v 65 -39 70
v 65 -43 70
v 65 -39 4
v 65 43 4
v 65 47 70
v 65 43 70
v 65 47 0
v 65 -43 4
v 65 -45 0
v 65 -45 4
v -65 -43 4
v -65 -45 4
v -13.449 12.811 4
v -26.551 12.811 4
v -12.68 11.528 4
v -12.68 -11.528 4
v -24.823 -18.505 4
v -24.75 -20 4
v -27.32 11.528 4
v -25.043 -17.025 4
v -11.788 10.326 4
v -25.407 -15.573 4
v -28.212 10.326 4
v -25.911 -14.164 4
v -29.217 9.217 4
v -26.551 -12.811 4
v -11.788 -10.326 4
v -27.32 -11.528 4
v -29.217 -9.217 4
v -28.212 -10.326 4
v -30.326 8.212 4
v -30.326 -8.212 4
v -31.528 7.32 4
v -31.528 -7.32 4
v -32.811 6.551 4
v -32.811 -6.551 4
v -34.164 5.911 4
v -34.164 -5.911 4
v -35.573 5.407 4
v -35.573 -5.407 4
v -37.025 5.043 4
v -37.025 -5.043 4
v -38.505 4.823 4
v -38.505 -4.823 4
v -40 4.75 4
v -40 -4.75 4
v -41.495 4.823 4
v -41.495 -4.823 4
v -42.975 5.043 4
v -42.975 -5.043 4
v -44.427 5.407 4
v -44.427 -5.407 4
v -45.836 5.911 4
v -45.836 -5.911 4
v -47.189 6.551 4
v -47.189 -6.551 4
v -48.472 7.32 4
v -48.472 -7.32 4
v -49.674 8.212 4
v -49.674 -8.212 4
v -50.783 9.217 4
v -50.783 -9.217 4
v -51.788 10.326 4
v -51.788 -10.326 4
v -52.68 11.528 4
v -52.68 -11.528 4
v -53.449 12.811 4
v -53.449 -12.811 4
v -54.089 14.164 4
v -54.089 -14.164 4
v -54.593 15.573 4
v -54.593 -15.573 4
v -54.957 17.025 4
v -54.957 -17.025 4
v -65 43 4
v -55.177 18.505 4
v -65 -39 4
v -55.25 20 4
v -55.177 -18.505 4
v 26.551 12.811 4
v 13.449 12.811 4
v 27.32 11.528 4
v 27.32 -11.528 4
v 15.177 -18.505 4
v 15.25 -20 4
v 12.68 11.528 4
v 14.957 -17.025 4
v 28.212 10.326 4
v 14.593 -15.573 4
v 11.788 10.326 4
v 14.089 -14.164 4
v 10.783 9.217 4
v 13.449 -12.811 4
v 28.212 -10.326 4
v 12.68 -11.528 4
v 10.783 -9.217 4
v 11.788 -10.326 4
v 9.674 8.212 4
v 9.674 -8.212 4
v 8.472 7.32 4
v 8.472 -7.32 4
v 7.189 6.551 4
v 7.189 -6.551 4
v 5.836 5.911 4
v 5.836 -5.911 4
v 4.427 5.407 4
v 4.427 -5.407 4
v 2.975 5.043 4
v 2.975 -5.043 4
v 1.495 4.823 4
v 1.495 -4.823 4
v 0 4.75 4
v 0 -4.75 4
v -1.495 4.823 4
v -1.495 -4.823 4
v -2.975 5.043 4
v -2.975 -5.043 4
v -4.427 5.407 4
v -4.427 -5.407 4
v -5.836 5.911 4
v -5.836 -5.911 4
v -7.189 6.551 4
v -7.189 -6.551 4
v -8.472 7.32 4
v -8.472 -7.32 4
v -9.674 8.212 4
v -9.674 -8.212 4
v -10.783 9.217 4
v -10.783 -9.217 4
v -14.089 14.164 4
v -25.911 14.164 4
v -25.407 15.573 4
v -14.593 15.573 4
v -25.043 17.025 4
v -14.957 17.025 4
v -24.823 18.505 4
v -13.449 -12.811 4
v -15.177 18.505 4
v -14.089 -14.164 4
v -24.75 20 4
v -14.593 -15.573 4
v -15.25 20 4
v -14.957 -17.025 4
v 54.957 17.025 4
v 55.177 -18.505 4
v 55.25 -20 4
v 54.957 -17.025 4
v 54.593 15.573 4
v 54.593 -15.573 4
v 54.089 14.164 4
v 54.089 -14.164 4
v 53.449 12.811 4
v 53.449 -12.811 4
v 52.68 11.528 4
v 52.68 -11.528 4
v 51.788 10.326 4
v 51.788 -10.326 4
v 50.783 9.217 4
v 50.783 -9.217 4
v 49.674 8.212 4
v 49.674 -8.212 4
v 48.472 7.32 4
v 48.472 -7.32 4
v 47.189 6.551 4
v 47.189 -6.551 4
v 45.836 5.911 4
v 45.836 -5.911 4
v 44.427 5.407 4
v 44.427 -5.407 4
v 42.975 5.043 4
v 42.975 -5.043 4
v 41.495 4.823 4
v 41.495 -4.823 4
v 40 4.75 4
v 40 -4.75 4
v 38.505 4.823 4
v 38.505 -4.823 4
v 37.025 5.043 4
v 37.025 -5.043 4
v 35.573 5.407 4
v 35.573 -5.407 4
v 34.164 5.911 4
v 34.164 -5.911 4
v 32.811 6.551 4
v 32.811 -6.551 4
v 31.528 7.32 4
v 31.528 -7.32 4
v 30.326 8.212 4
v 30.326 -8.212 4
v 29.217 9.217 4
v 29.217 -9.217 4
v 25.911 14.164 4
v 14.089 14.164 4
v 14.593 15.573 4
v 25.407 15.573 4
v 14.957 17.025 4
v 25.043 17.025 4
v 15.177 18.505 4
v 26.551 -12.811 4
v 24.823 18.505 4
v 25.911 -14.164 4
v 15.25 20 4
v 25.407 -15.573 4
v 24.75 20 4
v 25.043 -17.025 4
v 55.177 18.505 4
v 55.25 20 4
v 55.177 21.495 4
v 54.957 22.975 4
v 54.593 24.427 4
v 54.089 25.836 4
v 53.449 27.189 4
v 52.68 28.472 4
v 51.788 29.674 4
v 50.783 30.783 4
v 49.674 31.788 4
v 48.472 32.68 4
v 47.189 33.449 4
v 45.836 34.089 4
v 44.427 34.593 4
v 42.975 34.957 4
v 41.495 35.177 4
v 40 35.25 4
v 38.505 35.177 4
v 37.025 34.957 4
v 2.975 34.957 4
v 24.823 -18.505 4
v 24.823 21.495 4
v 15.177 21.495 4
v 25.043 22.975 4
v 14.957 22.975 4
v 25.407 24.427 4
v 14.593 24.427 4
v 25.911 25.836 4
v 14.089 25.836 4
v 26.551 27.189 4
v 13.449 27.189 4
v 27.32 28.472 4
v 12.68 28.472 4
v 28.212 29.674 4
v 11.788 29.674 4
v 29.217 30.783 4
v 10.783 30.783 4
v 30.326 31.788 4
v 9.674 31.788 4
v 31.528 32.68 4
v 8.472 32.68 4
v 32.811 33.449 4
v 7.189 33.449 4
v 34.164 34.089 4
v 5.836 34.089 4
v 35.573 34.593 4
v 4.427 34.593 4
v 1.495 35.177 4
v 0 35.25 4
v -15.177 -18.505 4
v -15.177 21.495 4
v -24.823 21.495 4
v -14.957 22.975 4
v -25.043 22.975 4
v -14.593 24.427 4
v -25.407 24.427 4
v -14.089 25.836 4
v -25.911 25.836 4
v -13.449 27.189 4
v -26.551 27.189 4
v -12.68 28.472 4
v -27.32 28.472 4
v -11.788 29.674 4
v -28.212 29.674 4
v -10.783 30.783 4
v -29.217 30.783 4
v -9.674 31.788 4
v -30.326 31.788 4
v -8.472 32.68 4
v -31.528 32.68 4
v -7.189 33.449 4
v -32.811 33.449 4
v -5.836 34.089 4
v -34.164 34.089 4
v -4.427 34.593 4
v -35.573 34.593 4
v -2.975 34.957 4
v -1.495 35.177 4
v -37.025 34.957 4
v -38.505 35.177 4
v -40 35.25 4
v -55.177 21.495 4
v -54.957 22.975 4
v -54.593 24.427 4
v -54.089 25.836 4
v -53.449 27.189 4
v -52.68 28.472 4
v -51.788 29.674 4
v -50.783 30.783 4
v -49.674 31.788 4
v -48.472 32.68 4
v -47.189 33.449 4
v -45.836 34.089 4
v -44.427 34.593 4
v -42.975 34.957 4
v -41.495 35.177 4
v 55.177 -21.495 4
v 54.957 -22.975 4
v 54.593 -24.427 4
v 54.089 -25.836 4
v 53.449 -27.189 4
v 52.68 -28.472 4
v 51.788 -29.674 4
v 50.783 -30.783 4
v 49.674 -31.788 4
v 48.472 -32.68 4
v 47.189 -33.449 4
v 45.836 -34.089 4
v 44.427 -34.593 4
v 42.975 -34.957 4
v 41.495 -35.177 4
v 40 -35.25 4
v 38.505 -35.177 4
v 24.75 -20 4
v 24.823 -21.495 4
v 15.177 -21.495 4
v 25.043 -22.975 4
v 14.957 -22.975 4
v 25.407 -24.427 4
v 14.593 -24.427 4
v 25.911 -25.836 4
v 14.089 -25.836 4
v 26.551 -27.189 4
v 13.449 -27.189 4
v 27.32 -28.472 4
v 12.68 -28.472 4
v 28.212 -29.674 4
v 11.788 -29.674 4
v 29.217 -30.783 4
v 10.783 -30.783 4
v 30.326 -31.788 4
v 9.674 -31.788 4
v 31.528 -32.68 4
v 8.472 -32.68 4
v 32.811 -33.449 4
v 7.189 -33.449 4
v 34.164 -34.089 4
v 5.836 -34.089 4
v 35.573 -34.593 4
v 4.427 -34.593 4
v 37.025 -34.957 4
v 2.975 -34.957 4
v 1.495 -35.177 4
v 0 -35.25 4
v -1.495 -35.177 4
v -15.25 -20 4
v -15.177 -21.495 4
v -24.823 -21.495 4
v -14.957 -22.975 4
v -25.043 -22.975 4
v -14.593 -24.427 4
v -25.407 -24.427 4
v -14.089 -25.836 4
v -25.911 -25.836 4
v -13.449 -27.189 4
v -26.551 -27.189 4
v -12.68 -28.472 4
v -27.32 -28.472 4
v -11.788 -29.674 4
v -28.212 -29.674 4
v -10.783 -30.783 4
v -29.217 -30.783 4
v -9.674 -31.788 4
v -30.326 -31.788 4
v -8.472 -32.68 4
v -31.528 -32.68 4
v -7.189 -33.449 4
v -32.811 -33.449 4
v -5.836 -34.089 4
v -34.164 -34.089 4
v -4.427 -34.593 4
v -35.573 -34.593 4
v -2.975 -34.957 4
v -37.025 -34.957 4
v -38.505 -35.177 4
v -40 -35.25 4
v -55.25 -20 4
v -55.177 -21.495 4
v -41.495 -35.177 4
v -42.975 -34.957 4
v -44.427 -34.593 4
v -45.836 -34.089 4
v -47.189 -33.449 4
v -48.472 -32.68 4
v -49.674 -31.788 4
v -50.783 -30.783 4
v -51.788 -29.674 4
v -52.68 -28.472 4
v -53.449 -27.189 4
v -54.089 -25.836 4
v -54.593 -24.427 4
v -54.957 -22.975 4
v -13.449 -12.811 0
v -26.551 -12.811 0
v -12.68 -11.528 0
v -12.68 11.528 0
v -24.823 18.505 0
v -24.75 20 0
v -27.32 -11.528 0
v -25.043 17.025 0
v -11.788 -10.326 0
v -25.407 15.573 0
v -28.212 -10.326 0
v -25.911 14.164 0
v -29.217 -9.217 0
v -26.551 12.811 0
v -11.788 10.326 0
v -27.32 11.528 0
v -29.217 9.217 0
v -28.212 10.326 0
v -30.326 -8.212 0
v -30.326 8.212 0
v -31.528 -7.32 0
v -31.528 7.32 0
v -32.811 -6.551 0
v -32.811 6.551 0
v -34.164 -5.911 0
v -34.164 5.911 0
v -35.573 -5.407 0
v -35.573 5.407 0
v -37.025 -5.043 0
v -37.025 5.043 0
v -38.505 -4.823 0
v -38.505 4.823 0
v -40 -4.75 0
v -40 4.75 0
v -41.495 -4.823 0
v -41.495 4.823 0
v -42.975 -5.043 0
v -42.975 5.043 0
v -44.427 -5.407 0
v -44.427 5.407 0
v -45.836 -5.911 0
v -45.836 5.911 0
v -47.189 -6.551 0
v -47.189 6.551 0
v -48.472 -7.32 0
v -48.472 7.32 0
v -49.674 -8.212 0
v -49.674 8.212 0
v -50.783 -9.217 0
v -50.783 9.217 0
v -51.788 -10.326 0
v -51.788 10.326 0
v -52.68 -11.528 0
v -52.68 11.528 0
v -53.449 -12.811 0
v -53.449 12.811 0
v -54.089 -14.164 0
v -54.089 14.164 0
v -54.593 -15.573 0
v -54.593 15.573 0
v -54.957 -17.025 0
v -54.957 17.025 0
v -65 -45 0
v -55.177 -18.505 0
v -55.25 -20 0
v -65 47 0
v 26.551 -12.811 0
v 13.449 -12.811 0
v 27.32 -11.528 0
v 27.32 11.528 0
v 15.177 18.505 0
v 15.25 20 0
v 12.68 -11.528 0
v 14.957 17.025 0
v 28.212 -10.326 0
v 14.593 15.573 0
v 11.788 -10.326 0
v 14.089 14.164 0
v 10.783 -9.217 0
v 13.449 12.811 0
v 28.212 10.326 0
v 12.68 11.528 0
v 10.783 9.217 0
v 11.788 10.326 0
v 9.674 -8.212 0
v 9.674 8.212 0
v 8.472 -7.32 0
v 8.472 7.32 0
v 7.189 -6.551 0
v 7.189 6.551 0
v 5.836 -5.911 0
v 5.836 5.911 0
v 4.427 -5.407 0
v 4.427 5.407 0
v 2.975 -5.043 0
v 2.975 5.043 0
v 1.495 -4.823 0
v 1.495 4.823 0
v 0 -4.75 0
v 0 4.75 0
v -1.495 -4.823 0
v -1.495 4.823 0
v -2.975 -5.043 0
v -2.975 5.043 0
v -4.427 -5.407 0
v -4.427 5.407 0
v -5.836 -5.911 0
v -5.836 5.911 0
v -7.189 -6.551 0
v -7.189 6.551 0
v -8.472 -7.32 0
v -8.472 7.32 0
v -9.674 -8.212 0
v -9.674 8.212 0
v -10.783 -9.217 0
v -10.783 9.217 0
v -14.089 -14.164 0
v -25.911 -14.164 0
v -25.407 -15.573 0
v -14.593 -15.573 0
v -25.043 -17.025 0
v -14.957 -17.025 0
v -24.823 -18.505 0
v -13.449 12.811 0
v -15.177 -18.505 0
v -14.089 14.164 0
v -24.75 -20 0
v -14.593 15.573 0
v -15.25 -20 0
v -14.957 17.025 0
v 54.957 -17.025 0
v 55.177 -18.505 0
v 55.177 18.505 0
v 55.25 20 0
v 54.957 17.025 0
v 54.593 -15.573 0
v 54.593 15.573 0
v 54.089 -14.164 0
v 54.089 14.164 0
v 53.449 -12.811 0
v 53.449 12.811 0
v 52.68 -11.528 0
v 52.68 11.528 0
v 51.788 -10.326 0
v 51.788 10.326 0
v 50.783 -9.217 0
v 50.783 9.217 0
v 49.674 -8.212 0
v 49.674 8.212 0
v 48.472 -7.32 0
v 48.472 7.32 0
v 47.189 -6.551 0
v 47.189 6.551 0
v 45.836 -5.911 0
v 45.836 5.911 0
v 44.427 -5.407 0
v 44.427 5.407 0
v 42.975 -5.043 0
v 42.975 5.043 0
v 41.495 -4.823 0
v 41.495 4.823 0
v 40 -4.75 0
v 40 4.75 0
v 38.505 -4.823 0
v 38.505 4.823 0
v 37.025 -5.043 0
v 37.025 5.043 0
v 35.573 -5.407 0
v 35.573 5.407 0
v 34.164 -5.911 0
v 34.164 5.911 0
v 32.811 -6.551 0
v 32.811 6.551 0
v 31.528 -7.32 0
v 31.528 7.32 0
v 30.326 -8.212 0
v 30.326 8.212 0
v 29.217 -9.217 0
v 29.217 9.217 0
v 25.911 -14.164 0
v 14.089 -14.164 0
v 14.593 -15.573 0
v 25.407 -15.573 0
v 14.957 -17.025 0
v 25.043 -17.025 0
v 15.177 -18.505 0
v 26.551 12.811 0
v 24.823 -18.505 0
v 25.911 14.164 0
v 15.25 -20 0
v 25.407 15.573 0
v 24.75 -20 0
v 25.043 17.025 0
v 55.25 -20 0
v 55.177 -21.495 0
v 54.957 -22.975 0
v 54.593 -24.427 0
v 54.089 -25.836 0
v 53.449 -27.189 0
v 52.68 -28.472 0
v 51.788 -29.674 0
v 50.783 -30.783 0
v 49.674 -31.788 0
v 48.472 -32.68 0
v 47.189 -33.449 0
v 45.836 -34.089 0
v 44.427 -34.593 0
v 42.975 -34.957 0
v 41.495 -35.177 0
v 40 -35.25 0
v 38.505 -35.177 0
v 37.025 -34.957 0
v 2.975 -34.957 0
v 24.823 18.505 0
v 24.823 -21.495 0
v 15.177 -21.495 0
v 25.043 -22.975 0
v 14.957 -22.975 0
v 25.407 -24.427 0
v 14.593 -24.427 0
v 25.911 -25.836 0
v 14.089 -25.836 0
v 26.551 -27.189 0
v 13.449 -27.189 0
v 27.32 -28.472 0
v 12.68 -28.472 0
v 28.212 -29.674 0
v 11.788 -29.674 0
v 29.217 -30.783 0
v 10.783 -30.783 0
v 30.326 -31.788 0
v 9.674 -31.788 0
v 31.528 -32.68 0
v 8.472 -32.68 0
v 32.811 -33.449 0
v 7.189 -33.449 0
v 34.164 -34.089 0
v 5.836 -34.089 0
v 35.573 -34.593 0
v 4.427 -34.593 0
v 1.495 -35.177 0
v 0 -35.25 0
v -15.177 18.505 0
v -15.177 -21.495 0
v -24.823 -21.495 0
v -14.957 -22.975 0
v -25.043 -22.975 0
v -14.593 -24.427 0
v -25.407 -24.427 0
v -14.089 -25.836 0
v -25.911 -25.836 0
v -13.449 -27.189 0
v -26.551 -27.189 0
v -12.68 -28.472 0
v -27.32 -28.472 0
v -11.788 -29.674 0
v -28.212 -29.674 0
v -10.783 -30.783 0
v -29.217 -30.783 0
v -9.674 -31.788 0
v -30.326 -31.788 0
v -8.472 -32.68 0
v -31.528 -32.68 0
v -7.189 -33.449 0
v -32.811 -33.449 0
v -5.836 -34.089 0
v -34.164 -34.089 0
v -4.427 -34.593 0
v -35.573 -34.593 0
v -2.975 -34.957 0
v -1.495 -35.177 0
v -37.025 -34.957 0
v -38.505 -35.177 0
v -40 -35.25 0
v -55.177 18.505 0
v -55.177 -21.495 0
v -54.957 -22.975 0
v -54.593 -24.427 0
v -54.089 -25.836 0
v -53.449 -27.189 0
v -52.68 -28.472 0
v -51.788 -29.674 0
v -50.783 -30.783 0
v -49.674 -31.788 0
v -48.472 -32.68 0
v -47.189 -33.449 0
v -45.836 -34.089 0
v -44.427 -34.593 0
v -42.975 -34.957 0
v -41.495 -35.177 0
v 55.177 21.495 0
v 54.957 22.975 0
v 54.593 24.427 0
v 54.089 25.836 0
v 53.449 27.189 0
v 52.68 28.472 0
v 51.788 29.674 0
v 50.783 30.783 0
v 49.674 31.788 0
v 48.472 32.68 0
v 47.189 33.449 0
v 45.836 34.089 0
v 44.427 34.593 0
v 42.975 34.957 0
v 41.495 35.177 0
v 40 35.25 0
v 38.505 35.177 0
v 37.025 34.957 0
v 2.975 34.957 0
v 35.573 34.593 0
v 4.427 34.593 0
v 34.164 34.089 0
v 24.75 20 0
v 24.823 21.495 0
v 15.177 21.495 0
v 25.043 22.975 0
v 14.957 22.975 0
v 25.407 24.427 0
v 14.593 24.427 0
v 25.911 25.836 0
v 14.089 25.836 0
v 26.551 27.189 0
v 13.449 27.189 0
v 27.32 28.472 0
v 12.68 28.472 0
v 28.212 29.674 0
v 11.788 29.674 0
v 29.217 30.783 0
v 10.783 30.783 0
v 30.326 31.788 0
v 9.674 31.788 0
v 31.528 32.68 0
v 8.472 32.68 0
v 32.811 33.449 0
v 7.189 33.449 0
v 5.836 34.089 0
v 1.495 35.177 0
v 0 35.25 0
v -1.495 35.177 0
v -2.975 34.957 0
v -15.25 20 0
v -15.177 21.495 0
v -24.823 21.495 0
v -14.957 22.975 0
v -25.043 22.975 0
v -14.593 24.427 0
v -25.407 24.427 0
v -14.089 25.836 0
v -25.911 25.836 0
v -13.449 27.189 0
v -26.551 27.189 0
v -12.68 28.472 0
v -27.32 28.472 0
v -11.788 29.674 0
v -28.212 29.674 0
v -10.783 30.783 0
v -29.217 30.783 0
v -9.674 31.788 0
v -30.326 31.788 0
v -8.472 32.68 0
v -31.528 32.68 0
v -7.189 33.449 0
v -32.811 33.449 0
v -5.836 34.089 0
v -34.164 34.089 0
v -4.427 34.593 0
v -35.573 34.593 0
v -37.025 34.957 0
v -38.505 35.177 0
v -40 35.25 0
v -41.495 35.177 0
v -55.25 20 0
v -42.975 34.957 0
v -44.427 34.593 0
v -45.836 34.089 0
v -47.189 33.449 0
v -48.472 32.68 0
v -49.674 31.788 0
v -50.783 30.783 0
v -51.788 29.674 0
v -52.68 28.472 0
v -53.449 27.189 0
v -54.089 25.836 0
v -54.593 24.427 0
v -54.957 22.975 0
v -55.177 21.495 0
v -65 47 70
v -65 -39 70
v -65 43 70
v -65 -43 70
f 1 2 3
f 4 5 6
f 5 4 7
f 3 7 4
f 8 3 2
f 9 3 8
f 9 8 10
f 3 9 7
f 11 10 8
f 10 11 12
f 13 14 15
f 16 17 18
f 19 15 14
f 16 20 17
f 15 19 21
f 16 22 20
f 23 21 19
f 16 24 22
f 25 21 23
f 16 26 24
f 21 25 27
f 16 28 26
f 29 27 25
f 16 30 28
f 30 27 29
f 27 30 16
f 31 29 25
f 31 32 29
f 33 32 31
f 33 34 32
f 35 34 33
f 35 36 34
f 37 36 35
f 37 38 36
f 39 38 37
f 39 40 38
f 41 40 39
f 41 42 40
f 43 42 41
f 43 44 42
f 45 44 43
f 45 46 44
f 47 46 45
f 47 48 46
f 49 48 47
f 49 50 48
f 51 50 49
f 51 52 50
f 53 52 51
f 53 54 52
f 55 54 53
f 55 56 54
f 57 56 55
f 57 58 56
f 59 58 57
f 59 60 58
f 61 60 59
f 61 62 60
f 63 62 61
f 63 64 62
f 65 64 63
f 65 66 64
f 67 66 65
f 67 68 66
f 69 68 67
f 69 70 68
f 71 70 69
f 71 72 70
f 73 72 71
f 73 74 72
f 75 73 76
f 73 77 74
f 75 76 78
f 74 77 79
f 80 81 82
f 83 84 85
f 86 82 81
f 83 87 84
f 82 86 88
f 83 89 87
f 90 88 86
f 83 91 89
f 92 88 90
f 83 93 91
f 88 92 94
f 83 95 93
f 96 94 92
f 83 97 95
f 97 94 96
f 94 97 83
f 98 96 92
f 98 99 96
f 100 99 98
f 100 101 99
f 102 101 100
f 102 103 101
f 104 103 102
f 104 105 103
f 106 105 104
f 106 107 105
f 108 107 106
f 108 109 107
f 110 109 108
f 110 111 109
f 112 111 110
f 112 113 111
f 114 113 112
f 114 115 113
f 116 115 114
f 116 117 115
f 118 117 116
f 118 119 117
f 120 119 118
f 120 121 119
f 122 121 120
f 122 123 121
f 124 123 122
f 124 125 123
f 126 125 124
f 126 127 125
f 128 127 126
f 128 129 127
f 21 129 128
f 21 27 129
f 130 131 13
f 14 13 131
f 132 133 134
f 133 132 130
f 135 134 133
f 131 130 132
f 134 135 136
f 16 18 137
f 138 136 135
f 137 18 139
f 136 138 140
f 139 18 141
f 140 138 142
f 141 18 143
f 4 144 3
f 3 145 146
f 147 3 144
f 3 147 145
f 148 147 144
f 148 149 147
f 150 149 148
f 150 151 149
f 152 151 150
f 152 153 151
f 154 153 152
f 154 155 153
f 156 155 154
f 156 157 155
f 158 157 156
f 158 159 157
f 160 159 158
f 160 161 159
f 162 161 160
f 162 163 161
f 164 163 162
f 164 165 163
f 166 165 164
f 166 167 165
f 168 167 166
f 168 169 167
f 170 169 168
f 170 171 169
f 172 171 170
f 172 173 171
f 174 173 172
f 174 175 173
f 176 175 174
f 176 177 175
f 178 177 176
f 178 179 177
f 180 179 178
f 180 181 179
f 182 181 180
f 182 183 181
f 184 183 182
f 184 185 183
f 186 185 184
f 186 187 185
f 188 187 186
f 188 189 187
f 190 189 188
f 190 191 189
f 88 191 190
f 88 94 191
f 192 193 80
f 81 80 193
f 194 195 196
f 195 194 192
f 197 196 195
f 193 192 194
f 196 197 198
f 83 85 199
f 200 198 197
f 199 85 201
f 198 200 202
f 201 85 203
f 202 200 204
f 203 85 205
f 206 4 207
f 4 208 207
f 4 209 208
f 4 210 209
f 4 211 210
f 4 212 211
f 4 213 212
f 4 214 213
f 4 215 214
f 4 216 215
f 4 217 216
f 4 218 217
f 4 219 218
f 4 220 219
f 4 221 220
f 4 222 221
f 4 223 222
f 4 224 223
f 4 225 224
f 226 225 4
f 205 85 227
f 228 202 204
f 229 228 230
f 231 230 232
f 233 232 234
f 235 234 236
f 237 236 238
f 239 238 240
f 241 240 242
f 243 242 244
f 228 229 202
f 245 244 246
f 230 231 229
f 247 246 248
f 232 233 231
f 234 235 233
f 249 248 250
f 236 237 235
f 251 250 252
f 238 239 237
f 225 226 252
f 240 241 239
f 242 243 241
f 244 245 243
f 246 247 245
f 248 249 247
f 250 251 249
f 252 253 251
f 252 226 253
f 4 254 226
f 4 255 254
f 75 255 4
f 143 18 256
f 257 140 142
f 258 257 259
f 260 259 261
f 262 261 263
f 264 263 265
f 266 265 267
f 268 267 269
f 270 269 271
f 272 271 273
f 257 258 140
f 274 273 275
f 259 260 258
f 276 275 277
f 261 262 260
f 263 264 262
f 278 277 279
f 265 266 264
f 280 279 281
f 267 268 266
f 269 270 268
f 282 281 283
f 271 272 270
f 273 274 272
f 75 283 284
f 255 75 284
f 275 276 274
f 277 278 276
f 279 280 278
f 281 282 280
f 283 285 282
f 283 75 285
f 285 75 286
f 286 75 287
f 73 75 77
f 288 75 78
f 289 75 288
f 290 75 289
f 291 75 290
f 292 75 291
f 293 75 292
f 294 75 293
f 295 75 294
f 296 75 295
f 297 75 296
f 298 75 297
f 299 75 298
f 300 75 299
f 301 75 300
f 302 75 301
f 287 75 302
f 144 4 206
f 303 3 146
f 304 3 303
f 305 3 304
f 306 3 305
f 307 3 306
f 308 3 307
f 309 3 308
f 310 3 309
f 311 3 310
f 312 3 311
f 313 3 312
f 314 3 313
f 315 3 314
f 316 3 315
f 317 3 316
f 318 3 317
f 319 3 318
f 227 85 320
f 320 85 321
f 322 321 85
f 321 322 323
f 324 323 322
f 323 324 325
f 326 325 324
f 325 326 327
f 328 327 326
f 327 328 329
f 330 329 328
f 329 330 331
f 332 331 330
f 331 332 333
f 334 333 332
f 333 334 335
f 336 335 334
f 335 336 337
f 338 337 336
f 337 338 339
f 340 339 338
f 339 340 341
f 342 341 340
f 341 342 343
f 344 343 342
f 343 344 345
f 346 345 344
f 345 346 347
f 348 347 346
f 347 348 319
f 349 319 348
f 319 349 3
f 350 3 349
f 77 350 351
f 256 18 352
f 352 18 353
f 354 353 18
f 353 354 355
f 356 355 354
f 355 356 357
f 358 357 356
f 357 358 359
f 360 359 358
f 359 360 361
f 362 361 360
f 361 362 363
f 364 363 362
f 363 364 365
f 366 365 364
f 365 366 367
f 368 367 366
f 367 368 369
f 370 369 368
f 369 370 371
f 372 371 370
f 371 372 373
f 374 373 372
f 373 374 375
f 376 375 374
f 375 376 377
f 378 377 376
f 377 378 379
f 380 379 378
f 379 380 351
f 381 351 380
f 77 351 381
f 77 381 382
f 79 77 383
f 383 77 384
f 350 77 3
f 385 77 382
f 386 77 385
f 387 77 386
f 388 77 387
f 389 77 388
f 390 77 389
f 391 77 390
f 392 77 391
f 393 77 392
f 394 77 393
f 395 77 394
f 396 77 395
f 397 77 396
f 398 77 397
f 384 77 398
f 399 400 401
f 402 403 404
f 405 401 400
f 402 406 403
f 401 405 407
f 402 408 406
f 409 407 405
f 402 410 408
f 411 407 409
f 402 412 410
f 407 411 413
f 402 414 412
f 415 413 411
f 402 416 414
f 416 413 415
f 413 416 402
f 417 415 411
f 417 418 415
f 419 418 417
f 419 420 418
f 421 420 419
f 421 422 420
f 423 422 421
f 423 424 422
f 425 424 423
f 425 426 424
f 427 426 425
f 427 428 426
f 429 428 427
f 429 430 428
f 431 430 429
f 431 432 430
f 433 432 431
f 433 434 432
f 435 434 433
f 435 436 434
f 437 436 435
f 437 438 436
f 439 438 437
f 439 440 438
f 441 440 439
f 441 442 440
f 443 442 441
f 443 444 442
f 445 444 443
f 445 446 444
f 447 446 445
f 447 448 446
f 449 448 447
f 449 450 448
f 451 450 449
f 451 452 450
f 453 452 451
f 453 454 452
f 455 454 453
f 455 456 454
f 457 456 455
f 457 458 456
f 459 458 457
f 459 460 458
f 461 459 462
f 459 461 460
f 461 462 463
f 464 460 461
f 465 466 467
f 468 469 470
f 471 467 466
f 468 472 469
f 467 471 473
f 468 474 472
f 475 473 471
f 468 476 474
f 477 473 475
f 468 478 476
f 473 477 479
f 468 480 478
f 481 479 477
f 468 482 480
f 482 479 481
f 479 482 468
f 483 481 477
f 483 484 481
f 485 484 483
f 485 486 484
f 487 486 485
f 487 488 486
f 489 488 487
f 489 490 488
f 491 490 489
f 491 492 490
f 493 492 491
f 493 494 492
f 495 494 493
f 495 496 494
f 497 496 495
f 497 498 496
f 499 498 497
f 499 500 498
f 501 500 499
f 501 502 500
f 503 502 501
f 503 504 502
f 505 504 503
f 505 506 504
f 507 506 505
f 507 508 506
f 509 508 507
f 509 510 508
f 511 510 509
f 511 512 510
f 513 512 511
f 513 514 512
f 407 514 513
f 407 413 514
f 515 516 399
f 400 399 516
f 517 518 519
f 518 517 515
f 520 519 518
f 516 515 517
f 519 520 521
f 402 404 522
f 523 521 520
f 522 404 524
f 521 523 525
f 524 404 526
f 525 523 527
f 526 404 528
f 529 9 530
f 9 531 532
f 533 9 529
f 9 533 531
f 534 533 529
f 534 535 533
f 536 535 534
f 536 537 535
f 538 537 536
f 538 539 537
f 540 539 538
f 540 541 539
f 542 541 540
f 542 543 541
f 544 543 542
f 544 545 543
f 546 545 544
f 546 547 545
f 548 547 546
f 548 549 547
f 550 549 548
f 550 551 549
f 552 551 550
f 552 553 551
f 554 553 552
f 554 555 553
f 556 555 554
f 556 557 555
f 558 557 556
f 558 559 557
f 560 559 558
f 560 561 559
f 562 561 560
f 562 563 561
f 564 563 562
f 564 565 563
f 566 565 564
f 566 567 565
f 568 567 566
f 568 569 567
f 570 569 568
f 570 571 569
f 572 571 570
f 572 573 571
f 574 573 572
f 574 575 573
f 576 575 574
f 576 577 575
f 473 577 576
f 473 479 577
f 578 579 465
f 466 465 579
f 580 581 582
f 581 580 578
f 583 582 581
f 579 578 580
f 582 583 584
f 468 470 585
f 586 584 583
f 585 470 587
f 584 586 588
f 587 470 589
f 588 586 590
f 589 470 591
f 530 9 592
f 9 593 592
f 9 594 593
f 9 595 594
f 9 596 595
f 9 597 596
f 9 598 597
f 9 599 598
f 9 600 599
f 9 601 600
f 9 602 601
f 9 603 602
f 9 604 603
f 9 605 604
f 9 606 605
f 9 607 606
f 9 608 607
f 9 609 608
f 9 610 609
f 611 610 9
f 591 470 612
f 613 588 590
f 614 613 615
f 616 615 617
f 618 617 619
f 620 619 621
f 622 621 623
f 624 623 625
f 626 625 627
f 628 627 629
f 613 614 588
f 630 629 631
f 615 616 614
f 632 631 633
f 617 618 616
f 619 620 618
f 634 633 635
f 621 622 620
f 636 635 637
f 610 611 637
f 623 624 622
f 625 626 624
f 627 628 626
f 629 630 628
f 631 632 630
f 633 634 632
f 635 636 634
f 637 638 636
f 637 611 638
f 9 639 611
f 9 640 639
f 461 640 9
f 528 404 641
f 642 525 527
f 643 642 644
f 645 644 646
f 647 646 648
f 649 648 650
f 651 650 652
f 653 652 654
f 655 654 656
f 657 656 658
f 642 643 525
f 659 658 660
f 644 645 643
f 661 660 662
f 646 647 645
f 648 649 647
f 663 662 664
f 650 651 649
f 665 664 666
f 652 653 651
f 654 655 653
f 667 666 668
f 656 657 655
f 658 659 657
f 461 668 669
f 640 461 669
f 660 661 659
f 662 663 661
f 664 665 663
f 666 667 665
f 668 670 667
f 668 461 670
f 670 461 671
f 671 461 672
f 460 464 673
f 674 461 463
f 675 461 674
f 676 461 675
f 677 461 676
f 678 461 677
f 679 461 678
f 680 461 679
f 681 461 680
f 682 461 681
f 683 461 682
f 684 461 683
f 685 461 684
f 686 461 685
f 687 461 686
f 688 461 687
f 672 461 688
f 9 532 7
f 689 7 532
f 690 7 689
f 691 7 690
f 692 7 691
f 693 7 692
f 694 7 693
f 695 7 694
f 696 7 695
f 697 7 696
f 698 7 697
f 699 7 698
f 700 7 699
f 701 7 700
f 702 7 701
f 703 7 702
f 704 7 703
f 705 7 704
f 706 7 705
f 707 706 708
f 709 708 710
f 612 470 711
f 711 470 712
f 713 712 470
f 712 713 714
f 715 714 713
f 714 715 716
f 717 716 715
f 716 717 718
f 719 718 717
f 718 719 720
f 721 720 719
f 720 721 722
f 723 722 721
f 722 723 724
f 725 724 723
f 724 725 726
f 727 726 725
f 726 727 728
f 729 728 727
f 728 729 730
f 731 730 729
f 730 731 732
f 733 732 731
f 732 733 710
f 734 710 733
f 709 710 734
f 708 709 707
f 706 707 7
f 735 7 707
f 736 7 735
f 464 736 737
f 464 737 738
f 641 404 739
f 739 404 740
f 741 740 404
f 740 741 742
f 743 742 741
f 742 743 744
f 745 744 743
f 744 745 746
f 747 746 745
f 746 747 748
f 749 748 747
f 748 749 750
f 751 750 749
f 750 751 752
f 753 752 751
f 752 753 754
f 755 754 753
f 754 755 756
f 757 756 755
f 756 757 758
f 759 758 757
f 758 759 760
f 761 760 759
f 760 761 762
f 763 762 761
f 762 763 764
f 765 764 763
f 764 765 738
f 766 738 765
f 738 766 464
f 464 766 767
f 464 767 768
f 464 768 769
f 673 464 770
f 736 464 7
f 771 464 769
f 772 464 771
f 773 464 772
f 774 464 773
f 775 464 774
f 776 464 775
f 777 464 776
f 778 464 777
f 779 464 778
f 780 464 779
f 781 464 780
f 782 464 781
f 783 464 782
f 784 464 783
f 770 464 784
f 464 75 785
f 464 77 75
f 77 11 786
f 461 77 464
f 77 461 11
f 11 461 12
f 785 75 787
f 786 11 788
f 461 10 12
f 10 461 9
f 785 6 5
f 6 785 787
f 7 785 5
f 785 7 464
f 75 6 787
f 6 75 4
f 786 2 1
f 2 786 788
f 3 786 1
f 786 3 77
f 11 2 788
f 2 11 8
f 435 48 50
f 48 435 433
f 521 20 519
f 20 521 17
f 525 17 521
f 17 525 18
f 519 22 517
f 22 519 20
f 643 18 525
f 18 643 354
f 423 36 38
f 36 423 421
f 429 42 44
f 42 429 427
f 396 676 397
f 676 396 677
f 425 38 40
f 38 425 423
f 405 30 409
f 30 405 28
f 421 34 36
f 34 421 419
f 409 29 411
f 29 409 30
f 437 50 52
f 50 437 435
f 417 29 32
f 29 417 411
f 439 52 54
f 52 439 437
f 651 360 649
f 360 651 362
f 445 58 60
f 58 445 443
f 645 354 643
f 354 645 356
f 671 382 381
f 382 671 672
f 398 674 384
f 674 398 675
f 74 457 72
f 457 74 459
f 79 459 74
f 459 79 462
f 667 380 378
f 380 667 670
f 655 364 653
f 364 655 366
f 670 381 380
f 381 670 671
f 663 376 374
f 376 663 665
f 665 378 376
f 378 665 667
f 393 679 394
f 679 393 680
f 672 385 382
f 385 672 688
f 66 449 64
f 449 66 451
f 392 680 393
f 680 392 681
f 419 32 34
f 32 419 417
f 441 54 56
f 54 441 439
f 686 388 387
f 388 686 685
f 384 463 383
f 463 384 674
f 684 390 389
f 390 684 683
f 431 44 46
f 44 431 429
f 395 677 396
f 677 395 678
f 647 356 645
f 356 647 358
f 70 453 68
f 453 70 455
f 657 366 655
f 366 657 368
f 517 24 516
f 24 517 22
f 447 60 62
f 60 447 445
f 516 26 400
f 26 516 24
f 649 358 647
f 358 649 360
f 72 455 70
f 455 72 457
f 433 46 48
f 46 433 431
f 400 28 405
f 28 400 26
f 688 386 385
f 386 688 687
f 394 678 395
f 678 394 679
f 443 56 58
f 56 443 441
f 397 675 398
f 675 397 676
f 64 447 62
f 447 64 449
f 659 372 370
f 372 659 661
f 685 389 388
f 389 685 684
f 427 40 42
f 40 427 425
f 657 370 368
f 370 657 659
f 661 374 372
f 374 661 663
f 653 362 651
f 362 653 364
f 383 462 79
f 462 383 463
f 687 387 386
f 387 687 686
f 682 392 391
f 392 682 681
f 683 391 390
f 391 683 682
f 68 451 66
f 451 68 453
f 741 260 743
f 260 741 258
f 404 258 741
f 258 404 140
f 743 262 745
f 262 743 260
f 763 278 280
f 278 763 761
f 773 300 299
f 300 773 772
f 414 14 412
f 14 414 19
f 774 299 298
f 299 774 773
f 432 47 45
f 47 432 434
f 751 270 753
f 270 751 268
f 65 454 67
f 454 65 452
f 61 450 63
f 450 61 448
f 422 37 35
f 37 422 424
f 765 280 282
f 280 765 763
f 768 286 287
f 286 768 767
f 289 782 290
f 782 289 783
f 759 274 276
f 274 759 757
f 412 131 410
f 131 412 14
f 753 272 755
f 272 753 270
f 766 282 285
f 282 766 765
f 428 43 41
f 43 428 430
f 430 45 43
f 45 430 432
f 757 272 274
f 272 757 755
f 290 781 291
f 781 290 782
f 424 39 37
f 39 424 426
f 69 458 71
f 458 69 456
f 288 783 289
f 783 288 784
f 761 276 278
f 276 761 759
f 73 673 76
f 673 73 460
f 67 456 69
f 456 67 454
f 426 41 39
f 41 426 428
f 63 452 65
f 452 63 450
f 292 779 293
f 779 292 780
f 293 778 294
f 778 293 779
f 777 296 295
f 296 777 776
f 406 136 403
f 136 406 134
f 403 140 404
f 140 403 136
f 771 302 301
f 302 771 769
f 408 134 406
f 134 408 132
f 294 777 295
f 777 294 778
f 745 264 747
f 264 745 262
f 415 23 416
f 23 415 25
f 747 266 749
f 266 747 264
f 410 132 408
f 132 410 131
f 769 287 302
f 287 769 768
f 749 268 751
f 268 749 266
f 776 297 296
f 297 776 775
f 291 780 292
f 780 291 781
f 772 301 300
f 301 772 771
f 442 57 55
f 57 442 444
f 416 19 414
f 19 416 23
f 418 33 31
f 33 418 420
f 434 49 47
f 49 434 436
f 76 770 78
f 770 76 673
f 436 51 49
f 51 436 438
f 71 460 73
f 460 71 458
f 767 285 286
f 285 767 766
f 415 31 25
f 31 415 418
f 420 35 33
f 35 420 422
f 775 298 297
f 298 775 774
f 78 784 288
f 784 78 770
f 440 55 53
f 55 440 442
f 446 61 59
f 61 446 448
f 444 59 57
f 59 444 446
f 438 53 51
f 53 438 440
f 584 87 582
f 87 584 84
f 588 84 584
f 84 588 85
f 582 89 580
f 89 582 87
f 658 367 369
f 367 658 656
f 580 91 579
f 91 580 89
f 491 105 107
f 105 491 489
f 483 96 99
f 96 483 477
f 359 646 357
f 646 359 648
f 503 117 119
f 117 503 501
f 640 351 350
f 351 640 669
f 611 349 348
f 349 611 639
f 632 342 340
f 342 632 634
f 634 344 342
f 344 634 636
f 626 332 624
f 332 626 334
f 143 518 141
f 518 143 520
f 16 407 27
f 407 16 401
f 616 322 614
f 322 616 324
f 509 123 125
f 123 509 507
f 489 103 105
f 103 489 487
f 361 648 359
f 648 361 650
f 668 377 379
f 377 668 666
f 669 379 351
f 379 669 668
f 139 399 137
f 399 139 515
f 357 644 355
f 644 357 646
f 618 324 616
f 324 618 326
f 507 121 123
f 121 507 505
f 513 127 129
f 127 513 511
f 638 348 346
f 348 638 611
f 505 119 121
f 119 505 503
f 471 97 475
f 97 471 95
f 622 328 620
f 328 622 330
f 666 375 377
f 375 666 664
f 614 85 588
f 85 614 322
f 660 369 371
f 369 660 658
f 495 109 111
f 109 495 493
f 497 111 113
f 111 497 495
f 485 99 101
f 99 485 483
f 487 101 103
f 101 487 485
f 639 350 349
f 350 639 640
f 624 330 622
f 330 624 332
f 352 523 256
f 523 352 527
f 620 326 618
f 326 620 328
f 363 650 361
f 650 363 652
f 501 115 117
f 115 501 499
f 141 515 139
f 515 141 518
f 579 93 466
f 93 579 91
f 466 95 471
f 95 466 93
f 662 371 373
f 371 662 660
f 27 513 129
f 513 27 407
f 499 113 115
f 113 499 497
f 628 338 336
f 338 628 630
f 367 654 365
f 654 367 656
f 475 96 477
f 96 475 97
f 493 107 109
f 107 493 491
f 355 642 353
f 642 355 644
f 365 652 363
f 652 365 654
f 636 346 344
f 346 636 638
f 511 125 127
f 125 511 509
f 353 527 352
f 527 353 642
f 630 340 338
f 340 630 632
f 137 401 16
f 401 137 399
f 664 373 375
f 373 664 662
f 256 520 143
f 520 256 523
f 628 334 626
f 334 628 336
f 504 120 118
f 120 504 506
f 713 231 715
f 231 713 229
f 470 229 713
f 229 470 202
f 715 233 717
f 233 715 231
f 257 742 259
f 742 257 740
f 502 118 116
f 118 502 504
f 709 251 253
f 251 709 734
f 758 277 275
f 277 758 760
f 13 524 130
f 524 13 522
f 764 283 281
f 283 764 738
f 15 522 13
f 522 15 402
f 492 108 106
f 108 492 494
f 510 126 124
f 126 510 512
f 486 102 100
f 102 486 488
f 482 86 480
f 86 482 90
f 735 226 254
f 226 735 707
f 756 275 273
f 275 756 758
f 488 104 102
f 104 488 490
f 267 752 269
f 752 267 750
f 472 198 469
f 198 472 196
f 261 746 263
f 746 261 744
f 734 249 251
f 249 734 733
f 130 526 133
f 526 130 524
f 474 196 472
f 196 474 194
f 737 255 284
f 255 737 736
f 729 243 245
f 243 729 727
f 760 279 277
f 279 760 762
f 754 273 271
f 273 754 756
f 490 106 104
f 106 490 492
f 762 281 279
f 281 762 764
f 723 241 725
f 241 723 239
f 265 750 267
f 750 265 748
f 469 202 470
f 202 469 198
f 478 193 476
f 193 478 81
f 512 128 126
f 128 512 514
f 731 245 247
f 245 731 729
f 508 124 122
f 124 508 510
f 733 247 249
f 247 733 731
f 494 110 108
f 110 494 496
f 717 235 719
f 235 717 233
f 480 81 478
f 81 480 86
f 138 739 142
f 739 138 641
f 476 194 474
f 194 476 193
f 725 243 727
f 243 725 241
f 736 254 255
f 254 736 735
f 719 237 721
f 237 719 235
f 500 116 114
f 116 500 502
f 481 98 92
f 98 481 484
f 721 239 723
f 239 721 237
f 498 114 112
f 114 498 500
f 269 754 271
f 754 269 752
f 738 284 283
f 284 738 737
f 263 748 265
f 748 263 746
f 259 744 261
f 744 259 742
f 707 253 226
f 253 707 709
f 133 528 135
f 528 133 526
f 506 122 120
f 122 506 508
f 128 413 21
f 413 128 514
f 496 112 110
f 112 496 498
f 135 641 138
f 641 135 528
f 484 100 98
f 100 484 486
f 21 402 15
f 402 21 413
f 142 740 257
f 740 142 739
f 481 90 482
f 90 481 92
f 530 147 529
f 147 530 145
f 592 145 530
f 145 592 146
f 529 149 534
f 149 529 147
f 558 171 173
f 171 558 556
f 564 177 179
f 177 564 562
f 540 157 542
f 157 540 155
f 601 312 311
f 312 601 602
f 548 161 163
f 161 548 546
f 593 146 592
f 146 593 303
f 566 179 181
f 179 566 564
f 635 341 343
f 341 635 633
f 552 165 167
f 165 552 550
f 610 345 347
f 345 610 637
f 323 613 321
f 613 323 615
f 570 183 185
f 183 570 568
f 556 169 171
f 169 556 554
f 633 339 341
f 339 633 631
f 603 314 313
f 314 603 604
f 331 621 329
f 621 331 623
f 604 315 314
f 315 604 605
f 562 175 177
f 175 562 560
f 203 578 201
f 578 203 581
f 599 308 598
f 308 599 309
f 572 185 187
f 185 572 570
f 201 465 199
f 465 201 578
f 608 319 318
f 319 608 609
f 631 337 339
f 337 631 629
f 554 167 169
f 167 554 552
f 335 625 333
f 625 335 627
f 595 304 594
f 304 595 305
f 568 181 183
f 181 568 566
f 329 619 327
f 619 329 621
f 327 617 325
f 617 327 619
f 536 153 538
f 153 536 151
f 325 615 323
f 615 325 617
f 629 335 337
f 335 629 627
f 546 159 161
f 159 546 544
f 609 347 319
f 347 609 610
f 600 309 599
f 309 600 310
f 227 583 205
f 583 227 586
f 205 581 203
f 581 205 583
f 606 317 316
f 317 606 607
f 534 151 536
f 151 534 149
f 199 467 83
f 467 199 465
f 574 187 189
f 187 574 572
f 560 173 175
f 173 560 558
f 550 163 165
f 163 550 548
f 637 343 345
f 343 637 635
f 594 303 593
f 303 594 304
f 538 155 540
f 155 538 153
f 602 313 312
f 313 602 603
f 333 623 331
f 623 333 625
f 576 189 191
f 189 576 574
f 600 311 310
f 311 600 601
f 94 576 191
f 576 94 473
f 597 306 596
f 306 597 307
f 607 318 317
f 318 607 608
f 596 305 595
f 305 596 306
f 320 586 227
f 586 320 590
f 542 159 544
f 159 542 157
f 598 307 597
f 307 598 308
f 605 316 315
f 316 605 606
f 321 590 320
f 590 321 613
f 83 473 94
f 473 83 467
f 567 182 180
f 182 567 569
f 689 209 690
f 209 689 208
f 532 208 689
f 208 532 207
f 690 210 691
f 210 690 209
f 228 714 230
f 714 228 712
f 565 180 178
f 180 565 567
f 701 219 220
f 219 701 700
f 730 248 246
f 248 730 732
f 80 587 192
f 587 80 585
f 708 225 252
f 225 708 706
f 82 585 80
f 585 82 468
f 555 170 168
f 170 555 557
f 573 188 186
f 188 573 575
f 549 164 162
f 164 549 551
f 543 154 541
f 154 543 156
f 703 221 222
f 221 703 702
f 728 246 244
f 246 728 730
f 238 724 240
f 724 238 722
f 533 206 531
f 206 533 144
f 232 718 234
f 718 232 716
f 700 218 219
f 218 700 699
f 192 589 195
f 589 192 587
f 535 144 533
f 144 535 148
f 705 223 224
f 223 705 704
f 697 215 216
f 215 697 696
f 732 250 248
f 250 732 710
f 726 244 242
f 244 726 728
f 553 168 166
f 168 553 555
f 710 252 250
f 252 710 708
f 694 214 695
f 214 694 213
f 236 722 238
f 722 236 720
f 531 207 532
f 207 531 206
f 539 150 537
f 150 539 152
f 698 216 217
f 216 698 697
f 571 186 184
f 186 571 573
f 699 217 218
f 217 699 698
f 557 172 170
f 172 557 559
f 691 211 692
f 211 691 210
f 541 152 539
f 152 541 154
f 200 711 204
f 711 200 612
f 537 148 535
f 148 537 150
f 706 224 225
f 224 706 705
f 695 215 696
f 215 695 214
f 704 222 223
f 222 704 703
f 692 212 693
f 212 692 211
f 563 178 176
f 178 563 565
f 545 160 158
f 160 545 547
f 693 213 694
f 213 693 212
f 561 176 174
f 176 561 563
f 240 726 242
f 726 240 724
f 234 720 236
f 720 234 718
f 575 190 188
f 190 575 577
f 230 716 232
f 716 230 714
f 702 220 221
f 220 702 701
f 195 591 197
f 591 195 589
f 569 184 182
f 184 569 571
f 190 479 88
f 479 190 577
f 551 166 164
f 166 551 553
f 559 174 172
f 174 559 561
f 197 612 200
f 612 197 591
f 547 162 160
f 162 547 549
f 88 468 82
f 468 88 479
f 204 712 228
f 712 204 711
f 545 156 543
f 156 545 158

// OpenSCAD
// 50 mL conical (Falcon) tube rack – printed upside-down, then flipped over.
// Print orientation: flat plate on the bed (z = 0..4), walls rising in +Z.
// After flipping, the rack stands on the two walls and tubes pass through the holes.

// ---- Dimensions (mm) ----
plate_X   = 130;   // plate length along X
plate_Y   = 90;    // plate width along Y
plate_T   = 4;     // plate thickness (z = 0 to 4)

wall_T    = 4;     // wall thickness (Y)
wall_H    = 70;    // wall height above the bed (z = 0 to 70)

hole_D    = 30.5;  // through-hole diameter
hole_R    = hole_D / 2;

pitch_X   = 40;    // hole centre spacing along X
pitch_Y   = 40;    // hole centre spacing along Y

$fn = 64;          // roundness for holes

// Hole centre coordinates: 2 rows (Y) x 3 columns (X), centred on the plate.
hole_X = [-pitch_X, 0, pitch_X];
hole_Y = [-pitch_Y / 2, pitch_Y / 2];

// ---- Base plate (z = 0 to plate_T), centred in X and Y ----
module plate() {
    translate([-plate_X / 2, -plate_Y / 2, 0])
        cube([plate_X, plate_Y, plate_T]);
}

// ---- Two long-edge walls (z = 0 to wall_H), flush with the plate's long edges ----
// Wall 1: along +Y edge (y = +plate_Y/2)
module wall_1() {
    translate([-plate_X / 2,  plate_Y / 2 - wall_T / 2, 0])
        cube([plate_X, wall_T, wall_H]);
}

// Wall 2: along -Y edge (y = -plate_Y/2)
module wall_2() {
    translate([-plate_X / 2, -plate_Y / 2 + wall_T / 2, 0])
        cube([plate_X, wall_T, wall_H]);
}

// ---- Six through-holes (extend 1 mm past each face to avoid coplanar cuts) ----
module holes() {
    for (hx = hole_X, hy = hole_Y)
        translate([hx, hy, -1])
            cylinder(h = plate_T + 2, r = hole_R, $fn = $fn);
}

// ---- Final solid ----
difference() {
    union() {
        plate();
        wall_1();
        wall_2();
    }
    holes();
}
